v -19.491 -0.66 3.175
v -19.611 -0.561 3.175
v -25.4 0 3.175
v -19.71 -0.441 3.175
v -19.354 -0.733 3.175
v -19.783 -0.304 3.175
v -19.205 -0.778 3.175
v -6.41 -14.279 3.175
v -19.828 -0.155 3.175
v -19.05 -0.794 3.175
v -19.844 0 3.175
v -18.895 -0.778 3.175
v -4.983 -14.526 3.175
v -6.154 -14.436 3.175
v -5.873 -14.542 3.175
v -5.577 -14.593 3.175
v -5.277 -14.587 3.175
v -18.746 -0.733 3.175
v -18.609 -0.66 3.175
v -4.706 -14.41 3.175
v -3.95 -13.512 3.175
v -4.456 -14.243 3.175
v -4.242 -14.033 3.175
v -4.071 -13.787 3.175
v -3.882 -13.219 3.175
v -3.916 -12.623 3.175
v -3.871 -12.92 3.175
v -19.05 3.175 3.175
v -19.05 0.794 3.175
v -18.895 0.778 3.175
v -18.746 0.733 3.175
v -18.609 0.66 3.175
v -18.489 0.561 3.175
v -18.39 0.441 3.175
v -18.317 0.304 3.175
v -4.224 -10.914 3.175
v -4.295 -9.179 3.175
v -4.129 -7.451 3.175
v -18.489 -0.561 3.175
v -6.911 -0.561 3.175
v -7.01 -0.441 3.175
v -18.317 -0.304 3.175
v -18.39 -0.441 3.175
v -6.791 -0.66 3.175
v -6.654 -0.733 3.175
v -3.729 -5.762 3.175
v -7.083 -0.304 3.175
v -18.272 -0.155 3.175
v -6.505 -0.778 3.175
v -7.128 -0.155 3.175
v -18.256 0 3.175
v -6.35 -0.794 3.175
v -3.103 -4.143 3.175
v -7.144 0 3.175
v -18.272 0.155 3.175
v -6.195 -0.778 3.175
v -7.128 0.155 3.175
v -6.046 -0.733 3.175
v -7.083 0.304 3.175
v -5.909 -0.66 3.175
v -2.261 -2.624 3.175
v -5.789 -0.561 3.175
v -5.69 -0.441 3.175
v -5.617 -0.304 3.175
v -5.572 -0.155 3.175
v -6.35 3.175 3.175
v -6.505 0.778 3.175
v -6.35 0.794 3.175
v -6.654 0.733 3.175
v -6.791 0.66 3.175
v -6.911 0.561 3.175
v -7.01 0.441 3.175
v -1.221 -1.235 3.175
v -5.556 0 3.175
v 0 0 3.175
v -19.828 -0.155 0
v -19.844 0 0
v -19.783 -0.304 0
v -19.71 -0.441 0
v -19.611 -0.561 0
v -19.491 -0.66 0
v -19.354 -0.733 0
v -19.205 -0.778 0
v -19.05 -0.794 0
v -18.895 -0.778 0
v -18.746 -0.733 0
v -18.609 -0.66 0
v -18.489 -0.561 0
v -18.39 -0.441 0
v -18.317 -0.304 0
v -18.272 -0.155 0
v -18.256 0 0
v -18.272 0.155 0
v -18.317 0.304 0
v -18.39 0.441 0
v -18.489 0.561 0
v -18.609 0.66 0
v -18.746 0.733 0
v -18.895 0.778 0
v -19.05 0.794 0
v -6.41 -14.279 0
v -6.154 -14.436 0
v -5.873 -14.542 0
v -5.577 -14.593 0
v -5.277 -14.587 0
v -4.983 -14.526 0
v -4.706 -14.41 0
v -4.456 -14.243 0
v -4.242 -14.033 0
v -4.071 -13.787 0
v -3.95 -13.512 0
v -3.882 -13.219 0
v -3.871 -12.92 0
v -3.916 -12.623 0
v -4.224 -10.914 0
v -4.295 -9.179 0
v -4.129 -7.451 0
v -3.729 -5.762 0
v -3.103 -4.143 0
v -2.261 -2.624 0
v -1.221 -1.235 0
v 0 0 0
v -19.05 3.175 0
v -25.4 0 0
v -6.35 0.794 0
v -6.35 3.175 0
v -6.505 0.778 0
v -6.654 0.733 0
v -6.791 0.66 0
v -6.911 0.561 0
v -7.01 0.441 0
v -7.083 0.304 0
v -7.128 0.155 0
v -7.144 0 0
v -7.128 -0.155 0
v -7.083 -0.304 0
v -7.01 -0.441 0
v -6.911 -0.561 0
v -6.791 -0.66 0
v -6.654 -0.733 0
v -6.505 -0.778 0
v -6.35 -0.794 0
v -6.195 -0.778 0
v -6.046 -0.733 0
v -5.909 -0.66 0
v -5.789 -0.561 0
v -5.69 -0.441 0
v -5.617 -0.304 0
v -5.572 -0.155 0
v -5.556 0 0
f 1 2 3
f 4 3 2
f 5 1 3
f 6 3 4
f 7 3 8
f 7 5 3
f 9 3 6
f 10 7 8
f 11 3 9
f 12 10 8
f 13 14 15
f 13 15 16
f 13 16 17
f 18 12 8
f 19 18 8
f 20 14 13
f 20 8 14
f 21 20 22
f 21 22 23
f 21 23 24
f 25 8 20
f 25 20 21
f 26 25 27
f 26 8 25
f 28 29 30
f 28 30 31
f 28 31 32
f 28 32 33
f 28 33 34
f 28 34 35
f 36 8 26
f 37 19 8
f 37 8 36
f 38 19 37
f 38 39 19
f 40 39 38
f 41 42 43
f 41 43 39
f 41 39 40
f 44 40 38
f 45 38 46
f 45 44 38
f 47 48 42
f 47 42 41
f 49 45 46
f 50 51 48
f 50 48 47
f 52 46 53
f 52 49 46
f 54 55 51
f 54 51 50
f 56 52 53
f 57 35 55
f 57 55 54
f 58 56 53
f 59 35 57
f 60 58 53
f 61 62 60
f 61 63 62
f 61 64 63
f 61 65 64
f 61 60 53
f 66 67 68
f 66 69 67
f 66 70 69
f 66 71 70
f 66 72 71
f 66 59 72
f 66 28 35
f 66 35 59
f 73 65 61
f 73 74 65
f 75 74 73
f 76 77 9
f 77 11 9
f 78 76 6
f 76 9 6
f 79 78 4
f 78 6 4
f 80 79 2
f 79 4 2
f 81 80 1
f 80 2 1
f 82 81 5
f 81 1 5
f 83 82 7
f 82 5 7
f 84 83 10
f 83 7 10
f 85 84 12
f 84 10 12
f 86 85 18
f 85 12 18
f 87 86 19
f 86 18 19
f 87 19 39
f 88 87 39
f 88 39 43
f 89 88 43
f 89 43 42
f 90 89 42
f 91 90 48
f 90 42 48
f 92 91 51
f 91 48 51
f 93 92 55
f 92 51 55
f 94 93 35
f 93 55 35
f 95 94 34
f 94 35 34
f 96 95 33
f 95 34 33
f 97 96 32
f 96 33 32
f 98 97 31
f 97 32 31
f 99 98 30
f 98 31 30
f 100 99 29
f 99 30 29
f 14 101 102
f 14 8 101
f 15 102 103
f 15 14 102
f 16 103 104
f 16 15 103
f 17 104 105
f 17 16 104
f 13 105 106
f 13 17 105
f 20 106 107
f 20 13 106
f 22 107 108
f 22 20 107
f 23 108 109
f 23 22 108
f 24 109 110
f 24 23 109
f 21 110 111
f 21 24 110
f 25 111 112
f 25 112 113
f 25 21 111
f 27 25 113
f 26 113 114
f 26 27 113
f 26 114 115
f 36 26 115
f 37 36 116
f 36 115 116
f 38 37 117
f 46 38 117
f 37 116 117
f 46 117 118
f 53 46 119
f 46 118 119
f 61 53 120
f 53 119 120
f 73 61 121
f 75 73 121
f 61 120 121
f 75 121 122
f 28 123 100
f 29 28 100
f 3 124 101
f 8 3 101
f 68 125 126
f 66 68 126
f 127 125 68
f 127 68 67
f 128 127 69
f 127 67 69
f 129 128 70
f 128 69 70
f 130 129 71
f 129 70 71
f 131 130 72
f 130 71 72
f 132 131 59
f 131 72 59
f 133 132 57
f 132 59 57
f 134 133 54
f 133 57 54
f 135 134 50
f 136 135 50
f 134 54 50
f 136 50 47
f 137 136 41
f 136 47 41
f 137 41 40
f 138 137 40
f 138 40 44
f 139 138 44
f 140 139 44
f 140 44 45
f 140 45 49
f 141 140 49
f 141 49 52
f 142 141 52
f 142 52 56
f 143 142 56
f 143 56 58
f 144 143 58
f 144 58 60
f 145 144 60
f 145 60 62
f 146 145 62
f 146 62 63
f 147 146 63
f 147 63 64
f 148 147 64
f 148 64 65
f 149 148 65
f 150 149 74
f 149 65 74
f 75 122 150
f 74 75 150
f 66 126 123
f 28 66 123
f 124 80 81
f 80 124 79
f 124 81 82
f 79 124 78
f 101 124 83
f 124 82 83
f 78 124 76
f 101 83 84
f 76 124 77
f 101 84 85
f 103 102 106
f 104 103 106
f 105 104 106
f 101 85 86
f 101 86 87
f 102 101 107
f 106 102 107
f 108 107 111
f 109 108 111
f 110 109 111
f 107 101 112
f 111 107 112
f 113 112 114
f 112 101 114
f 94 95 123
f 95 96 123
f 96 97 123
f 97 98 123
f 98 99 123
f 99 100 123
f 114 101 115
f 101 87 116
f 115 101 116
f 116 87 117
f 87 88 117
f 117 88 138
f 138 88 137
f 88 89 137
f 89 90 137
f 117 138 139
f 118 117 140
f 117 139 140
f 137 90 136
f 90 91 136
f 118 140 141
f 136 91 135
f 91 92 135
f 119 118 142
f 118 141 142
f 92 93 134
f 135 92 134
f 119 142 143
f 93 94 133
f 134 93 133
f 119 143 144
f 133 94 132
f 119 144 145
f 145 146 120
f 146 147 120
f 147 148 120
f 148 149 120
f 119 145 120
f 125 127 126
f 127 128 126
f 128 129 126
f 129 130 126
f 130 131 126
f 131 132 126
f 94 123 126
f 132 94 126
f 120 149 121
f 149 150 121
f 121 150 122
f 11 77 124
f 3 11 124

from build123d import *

# Parameters (mm, degrees)
BOSS_EXTRUDE1_DEPTH = 3.175
FILLET1_R           = 1.5875
SKETCH3_R           = 0.79375
CUT_EXTRUDE1_DEPTH  = 3.175


with BuildPart() as part:
    # Sketch2 → Boss-Extrude1 (new body)
    with BuildSketch(Plane.XY):
        with BuildLine():
            Line((-19.05, 0), (-25.4, 0))
            Line((-25.4, 0), (0.767904, -19.675721))
            ThreePointArc((0.767904, -19.675721), (-4.290078, -10.020279), (0, 0))
            Line((0, 0), (-6.35, 0))
            Line((-6.35, 0), (-6.35, 3.175))
            Line((-6.35, 3.175), (-19.05, 3.175))
            Line((-19.05, 3.175), (-19.05, 0))
        make_face()
    extrude(amount=BOSS_EXTRUDE1_DEPTH)

    # Fillet1
    fillet1_edges = [part.edges().sort_by_distance(p)[0] for p in [
        (0.767904, -19.675721, 1.5875),
    ]]
    fillet(fillet1_edges, radius=FILLET1_R)

    # Sketch3 → Cut-Extrude1 (cut)
    with BuildSketch(Plane.XY.offset(3.175)):
        with Locations((-19.05, 0)):
            Circle(SKETCH3_R)
        with Locations((-6.35, 0)):
            Circle(SKETCH3_R)
    extrude(amount=-CUT_EXTRUDE1_DEPTH, mode=Mode.SUBTRACT)


solid = part.part
